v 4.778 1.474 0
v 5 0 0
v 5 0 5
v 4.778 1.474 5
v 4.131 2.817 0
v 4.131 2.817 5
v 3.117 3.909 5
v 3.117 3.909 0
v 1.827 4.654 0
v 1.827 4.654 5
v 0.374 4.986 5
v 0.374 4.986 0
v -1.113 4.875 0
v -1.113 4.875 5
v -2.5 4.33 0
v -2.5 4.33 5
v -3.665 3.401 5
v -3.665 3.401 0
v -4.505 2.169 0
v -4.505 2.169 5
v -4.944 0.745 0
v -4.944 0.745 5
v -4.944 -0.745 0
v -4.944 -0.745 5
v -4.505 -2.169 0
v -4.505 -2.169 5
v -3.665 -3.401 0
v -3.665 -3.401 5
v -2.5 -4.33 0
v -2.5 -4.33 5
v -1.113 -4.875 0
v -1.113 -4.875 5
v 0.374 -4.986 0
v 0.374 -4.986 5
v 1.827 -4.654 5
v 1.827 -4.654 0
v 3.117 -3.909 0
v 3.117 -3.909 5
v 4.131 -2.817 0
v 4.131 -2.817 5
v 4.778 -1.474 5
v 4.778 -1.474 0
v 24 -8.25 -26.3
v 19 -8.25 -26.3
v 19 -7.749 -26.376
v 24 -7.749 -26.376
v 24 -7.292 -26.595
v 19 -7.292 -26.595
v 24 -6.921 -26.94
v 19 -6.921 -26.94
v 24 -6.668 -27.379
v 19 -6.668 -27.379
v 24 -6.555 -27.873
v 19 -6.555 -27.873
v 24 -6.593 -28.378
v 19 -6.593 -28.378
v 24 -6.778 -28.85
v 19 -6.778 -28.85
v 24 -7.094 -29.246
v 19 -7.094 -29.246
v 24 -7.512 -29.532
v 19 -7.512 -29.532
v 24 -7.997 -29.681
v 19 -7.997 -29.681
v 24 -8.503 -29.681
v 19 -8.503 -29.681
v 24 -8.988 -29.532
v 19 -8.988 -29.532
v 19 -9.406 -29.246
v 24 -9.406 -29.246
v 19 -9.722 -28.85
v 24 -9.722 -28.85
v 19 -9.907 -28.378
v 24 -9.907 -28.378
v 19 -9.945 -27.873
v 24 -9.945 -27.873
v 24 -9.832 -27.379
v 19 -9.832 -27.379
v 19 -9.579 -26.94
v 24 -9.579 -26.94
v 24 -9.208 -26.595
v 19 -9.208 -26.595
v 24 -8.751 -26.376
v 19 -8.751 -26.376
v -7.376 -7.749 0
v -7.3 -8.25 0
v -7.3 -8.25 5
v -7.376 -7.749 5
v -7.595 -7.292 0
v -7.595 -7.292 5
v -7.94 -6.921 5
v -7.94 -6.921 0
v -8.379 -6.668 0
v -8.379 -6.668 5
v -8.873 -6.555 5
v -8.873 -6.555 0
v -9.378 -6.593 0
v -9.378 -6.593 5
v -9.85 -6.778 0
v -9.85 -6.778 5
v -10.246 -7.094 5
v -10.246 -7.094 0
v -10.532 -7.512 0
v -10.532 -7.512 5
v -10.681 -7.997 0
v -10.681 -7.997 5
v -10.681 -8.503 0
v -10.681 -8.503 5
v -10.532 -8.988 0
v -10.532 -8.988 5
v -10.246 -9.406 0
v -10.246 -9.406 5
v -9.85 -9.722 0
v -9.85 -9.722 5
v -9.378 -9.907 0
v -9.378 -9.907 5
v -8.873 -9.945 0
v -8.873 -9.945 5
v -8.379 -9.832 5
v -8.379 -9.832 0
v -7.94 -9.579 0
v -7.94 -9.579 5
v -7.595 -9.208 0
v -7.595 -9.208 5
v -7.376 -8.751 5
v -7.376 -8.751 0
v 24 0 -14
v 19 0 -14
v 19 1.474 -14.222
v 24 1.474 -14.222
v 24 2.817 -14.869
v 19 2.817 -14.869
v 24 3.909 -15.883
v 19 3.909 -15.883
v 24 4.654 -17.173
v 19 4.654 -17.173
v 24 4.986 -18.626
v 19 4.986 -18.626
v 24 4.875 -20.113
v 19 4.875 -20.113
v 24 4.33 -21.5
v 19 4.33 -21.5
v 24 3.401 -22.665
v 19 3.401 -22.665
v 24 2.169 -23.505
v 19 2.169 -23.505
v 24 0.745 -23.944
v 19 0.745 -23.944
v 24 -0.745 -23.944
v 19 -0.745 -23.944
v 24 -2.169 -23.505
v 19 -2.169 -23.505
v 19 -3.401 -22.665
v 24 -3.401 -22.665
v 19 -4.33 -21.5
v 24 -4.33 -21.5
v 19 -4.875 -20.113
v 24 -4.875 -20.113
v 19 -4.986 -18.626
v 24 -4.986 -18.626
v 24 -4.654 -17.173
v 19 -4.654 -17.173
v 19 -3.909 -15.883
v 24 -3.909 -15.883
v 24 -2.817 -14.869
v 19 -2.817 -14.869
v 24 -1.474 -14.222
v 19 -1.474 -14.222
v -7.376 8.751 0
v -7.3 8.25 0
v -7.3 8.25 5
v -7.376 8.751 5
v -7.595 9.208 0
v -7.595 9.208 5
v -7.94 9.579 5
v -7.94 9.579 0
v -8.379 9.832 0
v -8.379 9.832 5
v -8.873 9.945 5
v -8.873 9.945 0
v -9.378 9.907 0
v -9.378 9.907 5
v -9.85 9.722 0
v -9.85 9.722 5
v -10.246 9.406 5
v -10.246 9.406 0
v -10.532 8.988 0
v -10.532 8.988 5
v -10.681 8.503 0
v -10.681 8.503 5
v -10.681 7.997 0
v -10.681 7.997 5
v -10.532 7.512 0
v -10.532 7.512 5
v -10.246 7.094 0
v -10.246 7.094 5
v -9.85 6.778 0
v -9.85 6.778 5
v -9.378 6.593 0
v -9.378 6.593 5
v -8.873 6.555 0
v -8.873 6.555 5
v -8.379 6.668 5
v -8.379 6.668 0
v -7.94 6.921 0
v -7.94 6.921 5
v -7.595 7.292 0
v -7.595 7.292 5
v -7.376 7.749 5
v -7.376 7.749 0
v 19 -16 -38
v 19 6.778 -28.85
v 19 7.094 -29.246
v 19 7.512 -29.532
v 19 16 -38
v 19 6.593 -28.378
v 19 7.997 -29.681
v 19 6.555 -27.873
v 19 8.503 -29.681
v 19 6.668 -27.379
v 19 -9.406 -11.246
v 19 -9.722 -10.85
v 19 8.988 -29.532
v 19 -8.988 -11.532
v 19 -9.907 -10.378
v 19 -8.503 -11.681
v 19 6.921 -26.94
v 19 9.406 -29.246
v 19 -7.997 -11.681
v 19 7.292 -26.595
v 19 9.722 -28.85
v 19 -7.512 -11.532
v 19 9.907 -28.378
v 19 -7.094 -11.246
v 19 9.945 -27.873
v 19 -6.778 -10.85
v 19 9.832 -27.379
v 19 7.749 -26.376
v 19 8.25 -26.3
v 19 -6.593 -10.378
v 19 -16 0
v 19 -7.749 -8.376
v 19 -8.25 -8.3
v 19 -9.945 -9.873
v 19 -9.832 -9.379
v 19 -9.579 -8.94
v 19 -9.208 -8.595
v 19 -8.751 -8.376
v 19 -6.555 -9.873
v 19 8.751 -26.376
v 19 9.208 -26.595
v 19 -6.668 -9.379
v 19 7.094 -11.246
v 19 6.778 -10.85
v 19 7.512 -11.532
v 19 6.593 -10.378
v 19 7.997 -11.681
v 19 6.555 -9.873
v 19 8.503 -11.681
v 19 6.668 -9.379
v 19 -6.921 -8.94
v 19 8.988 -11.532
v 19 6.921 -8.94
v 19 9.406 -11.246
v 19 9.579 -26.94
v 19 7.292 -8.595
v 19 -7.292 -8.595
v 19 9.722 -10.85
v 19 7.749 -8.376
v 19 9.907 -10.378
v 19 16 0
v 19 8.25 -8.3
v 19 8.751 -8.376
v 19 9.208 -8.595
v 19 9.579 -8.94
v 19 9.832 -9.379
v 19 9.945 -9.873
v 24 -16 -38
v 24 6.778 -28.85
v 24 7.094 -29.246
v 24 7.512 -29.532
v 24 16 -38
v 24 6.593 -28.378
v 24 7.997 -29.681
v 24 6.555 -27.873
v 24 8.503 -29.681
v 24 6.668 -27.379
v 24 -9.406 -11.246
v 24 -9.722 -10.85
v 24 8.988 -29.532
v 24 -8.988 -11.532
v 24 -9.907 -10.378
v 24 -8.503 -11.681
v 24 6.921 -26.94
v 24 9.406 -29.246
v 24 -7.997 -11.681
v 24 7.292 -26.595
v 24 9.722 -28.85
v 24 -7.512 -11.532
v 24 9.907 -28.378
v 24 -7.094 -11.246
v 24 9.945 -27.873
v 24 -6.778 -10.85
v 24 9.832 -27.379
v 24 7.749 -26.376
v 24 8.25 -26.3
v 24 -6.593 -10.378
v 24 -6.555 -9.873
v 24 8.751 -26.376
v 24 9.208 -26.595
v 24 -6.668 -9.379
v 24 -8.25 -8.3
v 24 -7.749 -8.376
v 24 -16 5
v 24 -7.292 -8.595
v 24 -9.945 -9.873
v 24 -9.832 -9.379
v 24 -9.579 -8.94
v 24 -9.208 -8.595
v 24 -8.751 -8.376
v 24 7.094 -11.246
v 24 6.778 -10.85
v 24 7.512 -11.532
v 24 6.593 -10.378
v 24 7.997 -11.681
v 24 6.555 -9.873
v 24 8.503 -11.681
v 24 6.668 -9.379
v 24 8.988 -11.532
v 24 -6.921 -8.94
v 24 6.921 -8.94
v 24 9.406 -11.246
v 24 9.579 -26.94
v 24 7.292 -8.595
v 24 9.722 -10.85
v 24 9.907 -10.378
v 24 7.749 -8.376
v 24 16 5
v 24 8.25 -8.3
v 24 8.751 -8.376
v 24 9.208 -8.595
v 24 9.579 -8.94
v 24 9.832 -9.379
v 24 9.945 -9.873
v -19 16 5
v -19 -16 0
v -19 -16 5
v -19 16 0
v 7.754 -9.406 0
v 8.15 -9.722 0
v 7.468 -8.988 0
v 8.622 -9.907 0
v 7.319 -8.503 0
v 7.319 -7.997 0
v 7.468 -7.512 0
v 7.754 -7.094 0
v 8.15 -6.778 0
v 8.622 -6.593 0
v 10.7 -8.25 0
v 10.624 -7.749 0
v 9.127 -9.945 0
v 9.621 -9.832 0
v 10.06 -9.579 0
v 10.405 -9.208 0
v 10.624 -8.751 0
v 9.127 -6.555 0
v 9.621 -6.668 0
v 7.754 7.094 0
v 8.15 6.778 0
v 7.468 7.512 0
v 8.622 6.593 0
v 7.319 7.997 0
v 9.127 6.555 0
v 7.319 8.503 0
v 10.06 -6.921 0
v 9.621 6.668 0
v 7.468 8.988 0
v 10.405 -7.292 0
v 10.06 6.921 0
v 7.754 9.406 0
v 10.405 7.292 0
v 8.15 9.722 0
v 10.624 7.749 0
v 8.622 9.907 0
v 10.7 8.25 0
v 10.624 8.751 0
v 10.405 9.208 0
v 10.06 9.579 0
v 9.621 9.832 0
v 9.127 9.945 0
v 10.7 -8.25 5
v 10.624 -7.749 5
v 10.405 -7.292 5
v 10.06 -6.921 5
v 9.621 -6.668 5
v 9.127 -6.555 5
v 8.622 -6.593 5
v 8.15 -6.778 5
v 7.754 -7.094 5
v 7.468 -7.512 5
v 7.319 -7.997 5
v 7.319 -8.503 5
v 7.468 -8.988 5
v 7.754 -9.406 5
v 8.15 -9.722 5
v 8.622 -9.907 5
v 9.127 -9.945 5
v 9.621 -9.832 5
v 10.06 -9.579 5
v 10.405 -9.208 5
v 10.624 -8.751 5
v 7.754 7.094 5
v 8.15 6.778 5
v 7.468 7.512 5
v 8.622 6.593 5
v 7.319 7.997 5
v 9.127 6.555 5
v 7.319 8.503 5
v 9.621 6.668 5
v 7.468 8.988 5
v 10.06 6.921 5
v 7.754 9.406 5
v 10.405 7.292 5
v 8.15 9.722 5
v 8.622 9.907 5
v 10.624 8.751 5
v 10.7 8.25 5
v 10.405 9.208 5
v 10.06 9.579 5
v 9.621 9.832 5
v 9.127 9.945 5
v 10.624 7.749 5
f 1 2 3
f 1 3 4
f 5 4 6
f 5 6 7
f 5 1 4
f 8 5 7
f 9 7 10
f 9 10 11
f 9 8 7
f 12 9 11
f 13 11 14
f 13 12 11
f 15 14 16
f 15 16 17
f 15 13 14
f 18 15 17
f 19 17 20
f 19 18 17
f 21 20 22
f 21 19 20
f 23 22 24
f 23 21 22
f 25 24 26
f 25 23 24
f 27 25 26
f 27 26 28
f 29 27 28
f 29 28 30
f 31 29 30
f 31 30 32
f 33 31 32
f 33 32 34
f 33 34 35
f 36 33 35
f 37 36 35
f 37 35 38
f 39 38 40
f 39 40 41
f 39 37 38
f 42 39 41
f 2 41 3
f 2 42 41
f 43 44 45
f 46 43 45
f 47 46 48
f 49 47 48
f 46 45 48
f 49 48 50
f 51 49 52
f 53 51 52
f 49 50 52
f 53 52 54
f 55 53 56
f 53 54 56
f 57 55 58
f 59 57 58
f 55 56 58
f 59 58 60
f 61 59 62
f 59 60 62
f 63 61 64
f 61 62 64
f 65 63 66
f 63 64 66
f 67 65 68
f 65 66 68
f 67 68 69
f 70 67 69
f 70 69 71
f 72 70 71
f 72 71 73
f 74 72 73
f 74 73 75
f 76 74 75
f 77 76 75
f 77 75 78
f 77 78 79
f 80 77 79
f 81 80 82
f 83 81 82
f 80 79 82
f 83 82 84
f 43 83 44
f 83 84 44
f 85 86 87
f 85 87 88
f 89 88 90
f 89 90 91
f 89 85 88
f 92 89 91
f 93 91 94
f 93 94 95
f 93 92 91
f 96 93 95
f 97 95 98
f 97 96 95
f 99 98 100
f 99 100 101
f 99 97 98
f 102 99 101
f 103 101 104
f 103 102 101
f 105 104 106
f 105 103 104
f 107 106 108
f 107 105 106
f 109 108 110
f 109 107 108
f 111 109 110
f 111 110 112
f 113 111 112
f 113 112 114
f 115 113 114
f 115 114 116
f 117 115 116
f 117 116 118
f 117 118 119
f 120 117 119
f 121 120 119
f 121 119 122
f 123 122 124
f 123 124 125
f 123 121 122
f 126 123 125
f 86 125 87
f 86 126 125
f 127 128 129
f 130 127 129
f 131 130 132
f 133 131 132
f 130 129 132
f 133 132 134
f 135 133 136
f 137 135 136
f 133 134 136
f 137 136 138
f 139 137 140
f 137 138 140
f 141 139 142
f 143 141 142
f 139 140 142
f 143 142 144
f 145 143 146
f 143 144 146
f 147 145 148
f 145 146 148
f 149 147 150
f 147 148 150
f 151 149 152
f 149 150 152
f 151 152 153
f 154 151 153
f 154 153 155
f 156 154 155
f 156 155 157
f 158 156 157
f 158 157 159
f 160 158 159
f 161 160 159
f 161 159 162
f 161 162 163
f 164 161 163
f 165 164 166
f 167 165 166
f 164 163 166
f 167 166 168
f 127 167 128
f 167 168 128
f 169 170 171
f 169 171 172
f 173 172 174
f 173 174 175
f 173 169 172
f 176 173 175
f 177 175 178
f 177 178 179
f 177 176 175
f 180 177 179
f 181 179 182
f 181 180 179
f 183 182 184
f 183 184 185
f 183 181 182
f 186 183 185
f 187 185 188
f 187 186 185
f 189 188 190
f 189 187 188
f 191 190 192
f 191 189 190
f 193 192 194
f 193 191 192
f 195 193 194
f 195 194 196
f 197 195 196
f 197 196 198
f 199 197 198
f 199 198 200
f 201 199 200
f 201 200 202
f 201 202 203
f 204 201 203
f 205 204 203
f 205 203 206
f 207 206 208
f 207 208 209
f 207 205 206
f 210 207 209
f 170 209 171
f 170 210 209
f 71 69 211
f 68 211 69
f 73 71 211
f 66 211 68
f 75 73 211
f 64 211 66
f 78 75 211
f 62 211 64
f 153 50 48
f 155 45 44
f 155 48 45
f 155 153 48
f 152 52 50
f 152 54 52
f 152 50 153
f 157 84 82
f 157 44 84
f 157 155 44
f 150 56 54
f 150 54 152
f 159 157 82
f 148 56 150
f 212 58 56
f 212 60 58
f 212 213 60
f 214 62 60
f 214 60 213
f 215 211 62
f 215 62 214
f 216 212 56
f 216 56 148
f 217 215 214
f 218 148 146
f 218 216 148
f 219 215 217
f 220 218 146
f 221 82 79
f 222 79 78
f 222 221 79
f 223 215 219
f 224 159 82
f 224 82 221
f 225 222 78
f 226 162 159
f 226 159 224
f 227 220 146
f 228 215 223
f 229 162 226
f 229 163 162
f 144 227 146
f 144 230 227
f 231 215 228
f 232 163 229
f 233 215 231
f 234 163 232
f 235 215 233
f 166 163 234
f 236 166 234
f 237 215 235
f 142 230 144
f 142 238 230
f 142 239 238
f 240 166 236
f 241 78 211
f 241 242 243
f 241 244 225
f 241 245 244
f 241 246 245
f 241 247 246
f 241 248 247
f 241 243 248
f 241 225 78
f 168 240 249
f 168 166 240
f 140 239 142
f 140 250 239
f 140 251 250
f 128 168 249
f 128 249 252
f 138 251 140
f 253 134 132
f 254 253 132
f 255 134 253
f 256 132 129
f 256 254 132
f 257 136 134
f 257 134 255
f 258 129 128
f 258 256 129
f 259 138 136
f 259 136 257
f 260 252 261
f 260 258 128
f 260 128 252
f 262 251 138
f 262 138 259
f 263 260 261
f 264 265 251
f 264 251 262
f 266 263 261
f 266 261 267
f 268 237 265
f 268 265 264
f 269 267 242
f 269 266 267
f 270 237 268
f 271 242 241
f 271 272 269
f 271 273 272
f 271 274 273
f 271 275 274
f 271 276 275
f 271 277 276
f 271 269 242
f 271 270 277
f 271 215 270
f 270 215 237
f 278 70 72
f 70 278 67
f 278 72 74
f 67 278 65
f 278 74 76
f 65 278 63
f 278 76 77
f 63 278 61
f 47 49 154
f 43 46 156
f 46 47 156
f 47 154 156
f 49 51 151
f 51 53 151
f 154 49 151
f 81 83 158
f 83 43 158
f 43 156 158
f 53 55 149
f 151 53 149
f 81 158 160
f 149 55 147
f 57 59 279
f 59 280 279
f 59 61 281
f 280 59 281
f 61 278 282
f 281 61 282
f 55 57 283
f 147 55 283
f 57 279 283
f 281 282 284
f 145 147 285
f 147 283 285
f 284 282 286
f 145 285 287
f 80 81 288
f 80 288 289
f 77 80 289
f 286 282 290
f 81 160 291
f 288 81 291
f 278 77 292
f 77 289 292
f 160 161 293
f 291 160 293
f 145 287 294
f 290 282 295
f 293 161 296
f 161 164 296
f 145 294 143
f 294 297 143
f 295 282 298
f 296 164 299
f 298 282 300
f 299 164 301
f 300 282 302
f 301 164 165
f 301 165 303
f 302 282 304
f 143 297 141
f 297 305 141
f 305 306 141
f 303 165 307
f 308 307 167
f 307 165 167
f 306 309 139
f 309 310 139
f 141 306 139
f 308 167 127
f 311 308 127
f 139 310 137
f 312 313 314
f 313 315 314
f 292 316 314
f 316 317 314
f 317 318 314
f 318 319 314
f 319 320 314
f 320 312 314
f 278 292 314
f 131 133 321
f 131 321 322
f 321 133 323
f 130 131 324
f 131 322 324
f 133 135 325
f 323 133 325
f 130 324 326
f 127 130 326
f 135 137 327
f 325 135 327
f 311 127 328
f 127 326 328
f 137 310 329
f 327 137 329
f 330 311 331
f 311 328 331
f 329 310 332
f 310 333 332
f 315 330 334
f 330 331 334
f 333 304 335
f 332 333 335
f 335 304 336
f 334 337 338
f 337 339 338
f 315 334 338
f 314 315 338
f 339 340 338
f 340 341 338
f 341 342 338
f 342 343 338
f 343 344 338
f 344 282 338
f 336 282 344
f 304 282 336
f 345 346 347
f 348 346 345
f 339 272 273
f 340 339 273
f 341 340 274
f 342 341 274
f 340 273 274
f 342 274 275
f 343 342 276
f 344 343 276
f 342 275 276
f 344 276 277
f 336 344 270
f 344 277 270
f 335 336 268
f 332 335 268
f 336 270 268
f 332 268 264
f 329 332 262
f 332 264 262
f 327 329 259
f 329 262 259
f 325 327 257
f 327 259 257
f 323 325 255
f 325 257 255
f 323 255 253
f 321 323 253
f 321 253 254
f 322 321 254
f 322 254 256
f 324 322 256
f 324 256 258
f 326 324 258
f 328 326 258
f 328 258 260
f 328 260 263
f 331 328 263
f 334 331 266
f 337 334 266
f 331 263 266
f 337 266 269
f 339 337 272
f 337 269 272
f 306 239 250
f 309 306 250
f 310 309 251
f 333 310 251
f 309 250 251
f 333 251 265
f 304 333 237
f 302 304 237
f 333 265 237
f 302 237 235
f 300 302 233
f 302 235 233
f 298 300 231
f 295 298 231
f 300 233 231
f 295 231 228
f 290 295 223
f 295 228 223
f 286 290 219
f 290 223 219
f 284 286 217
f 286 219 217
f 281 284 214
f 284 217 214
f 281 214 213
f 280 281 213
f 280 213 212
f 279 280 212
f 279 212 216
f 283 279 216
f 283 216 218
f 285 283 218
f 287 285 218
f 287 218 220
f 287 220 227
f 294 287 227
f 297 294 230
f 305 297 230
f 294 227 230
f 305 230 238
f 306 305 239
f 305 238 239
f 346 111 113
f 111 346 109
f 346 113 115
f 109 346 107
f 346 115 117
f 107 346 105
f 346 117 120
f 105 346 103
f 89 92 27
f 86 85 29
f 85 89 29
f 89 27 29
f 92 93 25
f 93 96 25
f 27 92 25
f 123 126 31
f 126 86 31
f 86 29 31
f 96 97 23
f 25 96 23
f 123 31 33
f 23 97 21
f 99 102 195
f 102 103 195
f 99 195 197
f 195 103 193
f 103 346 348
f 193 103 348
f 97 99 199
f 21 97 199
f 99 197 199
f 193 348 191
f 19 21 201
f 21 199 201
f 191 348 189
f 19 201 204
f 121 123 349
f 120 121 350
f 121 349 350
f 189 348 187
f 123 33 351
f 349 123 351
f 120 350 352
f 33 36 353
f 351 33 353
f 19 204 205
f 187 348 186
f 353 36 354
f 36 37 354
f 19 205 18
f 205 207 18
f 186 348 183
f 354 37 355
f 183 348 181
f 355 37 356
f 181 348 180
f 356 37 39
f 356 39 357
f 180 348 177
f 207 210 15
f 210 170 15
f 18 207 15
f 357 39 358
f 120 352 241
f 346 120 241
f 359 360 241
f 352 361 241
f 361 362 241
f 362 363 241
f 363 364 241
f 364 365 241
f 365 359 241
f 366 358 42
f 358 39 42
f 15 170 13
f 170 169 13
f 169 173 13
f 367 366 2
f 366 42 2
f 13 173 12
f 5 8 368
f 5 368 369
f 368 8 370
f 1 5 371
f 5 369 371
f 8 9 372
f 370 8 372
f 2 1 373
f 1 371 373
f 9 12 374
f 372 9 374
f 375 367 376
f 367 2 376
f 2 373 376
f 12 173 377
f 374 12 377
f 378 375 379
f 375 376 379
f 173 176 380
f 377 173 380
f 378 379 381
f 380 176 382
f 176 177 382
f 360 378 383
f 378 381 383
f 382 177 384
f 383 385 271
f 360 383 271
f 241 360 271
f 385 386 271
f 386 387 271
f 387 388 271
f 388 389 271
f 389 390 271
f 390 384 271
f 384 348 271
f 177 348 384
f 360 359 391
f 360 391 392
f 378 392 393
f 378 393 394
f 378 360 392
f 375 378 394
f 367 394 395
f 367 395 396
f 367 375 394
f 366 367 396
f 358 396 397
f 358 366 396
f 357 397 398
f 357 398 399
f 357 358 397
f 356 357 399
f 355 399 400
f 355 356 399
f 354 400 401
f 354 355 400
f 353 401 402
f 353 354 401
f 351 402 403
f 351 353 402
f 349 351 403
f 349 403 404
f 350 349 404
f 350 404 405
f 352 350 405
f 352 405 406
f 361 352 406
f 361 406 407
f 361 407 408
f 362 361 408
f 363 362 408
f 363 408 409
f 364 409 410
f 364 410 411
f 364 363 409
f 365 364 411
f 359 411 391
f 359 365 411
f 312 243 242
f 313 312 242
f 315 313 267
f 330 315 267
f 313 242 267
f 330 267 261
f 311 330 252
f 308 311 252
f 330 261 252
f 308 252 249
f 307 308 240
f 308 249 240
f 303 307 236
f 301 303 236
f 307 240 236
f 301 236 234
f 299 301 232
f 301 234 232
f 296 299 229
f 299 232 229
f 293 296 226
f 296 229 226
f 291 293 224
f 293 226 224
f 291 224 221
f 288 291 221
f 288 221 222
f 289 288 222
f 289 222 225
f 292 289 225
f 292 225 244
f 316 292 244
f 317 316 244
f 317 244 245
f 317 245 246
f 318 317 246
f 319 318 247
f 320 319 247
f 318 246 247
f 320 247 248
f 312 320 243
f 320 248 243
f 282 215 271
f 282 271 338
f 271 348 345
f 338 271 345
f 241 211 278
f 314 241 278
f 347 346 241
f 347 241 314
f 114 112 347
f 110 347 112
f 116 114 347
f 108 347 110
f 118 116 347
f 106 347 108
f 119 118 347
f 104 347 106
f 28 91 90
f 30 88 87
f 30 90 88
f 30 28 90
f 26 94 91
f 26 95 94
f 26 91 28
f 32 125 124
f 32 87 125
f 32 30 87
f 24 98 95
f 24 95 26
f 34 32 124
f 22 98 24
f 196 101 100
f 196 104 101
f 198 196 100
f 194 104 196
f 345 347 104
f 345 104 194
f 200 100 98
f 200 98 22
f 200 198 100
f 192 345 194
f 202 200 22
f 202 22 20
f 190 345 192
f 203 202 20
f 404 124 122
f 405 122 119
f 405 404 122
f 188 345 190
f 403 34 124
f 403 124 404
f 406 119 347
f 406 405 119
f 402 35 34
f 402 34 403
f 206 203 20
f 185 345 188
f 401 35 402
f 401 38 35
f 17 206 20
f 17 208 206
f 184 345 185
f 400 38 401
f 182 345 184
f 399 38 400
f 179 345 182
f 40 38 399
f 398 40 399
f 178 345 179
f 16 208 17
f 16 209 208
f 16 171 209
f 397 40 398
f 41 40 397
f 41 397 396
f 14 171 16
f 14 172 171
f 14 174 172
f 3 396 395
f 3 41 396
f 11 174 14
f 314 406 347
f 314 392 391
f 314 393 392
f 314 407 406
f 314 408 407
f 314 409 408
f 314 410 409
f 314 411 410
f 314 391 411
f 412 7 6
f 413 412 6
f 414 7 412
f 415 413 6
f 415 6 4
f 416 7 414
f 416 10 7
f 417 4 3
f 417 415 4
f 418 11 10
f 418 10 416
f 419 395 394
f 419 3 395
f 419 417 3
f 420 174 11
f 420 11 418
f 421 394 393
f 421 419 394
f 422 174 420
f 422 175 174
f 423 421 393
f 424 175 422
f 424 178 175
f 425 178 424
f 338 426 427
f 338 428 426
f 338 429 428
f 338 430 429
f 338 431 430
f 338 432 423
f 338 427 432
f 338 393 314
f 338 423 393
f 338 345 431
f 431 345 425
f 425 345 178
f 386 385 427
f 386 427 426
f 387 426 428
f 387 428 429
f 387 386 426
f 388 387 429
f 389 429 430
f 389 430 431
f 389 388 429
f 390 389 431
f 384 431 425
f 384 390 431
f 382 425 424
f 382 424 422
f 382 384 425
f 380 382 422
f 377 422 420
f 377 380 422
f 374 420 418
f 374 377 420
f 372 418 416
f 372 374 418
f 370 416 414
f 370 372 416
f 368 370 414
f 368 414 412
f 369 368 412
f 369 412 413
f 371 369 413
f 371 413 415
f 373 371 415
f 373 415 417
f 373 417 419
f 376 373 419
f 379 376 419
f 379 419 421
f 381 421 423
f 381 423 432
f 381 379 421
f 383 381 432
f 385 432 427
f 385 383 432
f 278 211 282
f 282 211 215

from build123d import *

# Parameters (mm, degrees)
SKETCH1_W           = 38
SKETCH1_H           = 32
SKETCH1_R           = 5
SKETCH1_R_2         = 1.7
BOSS_EXTRUDE1_DEPTH = 5
SKETCH2_W           = 5
SKETCH2_H           = 32
BOSS_EXTRUDE4_DEPTH = 5


with BuildPart() as part:
    # Sketch1 → Boss-Extrude1 (new body)
    with BuildSketch(Plane.XY):
        Rectangle(SKETCH1_W, SKETCH1_H)
        Circle(SKETCH1_R, mode=Mode.SUBTRACT)
        with Locations((-9, 8.25)):
            Circle(SKETCH1_R_2, mode=Mode.SUBTRACT)
        with Locations((9, 8.25)):
            Circle(SKETCH1_R_2, mode=Mode.SUBTRACT)
        with Locations((9, -8.25)):
            Circle(SKETCH1_R_2, mode=Mode.SUBTRACT)
        with Locations((-9, -8.25)):
            Circle(SKETCH1_R_2, mode=Mode.SUBTRACT)
    boss_extrude1 = extrude(amount=BOSS_EXTRUDE1_DEPTH)

    # Sketch2 → Boss-Extrude4 (add)
    with BuildSketch(Plane.XY):
        with Locations((21.5, 0)):
            Rectangle(SKETCH2_W, SKETCH2_H)
    extrude(amount=BOSS_EXTRUDE4_DEPTH)

    # Mirror3: Boss-Extrude1 across plane
    add(boss_extrude1.mirror(Plane(origin=(9.5, 0, -9.5), x_dir=(0.7071067811865478, 0, 0.7071067811865472), z_dir=(0.7071067811865475, 0, -0.7071067811865477))))


solid = part.part
